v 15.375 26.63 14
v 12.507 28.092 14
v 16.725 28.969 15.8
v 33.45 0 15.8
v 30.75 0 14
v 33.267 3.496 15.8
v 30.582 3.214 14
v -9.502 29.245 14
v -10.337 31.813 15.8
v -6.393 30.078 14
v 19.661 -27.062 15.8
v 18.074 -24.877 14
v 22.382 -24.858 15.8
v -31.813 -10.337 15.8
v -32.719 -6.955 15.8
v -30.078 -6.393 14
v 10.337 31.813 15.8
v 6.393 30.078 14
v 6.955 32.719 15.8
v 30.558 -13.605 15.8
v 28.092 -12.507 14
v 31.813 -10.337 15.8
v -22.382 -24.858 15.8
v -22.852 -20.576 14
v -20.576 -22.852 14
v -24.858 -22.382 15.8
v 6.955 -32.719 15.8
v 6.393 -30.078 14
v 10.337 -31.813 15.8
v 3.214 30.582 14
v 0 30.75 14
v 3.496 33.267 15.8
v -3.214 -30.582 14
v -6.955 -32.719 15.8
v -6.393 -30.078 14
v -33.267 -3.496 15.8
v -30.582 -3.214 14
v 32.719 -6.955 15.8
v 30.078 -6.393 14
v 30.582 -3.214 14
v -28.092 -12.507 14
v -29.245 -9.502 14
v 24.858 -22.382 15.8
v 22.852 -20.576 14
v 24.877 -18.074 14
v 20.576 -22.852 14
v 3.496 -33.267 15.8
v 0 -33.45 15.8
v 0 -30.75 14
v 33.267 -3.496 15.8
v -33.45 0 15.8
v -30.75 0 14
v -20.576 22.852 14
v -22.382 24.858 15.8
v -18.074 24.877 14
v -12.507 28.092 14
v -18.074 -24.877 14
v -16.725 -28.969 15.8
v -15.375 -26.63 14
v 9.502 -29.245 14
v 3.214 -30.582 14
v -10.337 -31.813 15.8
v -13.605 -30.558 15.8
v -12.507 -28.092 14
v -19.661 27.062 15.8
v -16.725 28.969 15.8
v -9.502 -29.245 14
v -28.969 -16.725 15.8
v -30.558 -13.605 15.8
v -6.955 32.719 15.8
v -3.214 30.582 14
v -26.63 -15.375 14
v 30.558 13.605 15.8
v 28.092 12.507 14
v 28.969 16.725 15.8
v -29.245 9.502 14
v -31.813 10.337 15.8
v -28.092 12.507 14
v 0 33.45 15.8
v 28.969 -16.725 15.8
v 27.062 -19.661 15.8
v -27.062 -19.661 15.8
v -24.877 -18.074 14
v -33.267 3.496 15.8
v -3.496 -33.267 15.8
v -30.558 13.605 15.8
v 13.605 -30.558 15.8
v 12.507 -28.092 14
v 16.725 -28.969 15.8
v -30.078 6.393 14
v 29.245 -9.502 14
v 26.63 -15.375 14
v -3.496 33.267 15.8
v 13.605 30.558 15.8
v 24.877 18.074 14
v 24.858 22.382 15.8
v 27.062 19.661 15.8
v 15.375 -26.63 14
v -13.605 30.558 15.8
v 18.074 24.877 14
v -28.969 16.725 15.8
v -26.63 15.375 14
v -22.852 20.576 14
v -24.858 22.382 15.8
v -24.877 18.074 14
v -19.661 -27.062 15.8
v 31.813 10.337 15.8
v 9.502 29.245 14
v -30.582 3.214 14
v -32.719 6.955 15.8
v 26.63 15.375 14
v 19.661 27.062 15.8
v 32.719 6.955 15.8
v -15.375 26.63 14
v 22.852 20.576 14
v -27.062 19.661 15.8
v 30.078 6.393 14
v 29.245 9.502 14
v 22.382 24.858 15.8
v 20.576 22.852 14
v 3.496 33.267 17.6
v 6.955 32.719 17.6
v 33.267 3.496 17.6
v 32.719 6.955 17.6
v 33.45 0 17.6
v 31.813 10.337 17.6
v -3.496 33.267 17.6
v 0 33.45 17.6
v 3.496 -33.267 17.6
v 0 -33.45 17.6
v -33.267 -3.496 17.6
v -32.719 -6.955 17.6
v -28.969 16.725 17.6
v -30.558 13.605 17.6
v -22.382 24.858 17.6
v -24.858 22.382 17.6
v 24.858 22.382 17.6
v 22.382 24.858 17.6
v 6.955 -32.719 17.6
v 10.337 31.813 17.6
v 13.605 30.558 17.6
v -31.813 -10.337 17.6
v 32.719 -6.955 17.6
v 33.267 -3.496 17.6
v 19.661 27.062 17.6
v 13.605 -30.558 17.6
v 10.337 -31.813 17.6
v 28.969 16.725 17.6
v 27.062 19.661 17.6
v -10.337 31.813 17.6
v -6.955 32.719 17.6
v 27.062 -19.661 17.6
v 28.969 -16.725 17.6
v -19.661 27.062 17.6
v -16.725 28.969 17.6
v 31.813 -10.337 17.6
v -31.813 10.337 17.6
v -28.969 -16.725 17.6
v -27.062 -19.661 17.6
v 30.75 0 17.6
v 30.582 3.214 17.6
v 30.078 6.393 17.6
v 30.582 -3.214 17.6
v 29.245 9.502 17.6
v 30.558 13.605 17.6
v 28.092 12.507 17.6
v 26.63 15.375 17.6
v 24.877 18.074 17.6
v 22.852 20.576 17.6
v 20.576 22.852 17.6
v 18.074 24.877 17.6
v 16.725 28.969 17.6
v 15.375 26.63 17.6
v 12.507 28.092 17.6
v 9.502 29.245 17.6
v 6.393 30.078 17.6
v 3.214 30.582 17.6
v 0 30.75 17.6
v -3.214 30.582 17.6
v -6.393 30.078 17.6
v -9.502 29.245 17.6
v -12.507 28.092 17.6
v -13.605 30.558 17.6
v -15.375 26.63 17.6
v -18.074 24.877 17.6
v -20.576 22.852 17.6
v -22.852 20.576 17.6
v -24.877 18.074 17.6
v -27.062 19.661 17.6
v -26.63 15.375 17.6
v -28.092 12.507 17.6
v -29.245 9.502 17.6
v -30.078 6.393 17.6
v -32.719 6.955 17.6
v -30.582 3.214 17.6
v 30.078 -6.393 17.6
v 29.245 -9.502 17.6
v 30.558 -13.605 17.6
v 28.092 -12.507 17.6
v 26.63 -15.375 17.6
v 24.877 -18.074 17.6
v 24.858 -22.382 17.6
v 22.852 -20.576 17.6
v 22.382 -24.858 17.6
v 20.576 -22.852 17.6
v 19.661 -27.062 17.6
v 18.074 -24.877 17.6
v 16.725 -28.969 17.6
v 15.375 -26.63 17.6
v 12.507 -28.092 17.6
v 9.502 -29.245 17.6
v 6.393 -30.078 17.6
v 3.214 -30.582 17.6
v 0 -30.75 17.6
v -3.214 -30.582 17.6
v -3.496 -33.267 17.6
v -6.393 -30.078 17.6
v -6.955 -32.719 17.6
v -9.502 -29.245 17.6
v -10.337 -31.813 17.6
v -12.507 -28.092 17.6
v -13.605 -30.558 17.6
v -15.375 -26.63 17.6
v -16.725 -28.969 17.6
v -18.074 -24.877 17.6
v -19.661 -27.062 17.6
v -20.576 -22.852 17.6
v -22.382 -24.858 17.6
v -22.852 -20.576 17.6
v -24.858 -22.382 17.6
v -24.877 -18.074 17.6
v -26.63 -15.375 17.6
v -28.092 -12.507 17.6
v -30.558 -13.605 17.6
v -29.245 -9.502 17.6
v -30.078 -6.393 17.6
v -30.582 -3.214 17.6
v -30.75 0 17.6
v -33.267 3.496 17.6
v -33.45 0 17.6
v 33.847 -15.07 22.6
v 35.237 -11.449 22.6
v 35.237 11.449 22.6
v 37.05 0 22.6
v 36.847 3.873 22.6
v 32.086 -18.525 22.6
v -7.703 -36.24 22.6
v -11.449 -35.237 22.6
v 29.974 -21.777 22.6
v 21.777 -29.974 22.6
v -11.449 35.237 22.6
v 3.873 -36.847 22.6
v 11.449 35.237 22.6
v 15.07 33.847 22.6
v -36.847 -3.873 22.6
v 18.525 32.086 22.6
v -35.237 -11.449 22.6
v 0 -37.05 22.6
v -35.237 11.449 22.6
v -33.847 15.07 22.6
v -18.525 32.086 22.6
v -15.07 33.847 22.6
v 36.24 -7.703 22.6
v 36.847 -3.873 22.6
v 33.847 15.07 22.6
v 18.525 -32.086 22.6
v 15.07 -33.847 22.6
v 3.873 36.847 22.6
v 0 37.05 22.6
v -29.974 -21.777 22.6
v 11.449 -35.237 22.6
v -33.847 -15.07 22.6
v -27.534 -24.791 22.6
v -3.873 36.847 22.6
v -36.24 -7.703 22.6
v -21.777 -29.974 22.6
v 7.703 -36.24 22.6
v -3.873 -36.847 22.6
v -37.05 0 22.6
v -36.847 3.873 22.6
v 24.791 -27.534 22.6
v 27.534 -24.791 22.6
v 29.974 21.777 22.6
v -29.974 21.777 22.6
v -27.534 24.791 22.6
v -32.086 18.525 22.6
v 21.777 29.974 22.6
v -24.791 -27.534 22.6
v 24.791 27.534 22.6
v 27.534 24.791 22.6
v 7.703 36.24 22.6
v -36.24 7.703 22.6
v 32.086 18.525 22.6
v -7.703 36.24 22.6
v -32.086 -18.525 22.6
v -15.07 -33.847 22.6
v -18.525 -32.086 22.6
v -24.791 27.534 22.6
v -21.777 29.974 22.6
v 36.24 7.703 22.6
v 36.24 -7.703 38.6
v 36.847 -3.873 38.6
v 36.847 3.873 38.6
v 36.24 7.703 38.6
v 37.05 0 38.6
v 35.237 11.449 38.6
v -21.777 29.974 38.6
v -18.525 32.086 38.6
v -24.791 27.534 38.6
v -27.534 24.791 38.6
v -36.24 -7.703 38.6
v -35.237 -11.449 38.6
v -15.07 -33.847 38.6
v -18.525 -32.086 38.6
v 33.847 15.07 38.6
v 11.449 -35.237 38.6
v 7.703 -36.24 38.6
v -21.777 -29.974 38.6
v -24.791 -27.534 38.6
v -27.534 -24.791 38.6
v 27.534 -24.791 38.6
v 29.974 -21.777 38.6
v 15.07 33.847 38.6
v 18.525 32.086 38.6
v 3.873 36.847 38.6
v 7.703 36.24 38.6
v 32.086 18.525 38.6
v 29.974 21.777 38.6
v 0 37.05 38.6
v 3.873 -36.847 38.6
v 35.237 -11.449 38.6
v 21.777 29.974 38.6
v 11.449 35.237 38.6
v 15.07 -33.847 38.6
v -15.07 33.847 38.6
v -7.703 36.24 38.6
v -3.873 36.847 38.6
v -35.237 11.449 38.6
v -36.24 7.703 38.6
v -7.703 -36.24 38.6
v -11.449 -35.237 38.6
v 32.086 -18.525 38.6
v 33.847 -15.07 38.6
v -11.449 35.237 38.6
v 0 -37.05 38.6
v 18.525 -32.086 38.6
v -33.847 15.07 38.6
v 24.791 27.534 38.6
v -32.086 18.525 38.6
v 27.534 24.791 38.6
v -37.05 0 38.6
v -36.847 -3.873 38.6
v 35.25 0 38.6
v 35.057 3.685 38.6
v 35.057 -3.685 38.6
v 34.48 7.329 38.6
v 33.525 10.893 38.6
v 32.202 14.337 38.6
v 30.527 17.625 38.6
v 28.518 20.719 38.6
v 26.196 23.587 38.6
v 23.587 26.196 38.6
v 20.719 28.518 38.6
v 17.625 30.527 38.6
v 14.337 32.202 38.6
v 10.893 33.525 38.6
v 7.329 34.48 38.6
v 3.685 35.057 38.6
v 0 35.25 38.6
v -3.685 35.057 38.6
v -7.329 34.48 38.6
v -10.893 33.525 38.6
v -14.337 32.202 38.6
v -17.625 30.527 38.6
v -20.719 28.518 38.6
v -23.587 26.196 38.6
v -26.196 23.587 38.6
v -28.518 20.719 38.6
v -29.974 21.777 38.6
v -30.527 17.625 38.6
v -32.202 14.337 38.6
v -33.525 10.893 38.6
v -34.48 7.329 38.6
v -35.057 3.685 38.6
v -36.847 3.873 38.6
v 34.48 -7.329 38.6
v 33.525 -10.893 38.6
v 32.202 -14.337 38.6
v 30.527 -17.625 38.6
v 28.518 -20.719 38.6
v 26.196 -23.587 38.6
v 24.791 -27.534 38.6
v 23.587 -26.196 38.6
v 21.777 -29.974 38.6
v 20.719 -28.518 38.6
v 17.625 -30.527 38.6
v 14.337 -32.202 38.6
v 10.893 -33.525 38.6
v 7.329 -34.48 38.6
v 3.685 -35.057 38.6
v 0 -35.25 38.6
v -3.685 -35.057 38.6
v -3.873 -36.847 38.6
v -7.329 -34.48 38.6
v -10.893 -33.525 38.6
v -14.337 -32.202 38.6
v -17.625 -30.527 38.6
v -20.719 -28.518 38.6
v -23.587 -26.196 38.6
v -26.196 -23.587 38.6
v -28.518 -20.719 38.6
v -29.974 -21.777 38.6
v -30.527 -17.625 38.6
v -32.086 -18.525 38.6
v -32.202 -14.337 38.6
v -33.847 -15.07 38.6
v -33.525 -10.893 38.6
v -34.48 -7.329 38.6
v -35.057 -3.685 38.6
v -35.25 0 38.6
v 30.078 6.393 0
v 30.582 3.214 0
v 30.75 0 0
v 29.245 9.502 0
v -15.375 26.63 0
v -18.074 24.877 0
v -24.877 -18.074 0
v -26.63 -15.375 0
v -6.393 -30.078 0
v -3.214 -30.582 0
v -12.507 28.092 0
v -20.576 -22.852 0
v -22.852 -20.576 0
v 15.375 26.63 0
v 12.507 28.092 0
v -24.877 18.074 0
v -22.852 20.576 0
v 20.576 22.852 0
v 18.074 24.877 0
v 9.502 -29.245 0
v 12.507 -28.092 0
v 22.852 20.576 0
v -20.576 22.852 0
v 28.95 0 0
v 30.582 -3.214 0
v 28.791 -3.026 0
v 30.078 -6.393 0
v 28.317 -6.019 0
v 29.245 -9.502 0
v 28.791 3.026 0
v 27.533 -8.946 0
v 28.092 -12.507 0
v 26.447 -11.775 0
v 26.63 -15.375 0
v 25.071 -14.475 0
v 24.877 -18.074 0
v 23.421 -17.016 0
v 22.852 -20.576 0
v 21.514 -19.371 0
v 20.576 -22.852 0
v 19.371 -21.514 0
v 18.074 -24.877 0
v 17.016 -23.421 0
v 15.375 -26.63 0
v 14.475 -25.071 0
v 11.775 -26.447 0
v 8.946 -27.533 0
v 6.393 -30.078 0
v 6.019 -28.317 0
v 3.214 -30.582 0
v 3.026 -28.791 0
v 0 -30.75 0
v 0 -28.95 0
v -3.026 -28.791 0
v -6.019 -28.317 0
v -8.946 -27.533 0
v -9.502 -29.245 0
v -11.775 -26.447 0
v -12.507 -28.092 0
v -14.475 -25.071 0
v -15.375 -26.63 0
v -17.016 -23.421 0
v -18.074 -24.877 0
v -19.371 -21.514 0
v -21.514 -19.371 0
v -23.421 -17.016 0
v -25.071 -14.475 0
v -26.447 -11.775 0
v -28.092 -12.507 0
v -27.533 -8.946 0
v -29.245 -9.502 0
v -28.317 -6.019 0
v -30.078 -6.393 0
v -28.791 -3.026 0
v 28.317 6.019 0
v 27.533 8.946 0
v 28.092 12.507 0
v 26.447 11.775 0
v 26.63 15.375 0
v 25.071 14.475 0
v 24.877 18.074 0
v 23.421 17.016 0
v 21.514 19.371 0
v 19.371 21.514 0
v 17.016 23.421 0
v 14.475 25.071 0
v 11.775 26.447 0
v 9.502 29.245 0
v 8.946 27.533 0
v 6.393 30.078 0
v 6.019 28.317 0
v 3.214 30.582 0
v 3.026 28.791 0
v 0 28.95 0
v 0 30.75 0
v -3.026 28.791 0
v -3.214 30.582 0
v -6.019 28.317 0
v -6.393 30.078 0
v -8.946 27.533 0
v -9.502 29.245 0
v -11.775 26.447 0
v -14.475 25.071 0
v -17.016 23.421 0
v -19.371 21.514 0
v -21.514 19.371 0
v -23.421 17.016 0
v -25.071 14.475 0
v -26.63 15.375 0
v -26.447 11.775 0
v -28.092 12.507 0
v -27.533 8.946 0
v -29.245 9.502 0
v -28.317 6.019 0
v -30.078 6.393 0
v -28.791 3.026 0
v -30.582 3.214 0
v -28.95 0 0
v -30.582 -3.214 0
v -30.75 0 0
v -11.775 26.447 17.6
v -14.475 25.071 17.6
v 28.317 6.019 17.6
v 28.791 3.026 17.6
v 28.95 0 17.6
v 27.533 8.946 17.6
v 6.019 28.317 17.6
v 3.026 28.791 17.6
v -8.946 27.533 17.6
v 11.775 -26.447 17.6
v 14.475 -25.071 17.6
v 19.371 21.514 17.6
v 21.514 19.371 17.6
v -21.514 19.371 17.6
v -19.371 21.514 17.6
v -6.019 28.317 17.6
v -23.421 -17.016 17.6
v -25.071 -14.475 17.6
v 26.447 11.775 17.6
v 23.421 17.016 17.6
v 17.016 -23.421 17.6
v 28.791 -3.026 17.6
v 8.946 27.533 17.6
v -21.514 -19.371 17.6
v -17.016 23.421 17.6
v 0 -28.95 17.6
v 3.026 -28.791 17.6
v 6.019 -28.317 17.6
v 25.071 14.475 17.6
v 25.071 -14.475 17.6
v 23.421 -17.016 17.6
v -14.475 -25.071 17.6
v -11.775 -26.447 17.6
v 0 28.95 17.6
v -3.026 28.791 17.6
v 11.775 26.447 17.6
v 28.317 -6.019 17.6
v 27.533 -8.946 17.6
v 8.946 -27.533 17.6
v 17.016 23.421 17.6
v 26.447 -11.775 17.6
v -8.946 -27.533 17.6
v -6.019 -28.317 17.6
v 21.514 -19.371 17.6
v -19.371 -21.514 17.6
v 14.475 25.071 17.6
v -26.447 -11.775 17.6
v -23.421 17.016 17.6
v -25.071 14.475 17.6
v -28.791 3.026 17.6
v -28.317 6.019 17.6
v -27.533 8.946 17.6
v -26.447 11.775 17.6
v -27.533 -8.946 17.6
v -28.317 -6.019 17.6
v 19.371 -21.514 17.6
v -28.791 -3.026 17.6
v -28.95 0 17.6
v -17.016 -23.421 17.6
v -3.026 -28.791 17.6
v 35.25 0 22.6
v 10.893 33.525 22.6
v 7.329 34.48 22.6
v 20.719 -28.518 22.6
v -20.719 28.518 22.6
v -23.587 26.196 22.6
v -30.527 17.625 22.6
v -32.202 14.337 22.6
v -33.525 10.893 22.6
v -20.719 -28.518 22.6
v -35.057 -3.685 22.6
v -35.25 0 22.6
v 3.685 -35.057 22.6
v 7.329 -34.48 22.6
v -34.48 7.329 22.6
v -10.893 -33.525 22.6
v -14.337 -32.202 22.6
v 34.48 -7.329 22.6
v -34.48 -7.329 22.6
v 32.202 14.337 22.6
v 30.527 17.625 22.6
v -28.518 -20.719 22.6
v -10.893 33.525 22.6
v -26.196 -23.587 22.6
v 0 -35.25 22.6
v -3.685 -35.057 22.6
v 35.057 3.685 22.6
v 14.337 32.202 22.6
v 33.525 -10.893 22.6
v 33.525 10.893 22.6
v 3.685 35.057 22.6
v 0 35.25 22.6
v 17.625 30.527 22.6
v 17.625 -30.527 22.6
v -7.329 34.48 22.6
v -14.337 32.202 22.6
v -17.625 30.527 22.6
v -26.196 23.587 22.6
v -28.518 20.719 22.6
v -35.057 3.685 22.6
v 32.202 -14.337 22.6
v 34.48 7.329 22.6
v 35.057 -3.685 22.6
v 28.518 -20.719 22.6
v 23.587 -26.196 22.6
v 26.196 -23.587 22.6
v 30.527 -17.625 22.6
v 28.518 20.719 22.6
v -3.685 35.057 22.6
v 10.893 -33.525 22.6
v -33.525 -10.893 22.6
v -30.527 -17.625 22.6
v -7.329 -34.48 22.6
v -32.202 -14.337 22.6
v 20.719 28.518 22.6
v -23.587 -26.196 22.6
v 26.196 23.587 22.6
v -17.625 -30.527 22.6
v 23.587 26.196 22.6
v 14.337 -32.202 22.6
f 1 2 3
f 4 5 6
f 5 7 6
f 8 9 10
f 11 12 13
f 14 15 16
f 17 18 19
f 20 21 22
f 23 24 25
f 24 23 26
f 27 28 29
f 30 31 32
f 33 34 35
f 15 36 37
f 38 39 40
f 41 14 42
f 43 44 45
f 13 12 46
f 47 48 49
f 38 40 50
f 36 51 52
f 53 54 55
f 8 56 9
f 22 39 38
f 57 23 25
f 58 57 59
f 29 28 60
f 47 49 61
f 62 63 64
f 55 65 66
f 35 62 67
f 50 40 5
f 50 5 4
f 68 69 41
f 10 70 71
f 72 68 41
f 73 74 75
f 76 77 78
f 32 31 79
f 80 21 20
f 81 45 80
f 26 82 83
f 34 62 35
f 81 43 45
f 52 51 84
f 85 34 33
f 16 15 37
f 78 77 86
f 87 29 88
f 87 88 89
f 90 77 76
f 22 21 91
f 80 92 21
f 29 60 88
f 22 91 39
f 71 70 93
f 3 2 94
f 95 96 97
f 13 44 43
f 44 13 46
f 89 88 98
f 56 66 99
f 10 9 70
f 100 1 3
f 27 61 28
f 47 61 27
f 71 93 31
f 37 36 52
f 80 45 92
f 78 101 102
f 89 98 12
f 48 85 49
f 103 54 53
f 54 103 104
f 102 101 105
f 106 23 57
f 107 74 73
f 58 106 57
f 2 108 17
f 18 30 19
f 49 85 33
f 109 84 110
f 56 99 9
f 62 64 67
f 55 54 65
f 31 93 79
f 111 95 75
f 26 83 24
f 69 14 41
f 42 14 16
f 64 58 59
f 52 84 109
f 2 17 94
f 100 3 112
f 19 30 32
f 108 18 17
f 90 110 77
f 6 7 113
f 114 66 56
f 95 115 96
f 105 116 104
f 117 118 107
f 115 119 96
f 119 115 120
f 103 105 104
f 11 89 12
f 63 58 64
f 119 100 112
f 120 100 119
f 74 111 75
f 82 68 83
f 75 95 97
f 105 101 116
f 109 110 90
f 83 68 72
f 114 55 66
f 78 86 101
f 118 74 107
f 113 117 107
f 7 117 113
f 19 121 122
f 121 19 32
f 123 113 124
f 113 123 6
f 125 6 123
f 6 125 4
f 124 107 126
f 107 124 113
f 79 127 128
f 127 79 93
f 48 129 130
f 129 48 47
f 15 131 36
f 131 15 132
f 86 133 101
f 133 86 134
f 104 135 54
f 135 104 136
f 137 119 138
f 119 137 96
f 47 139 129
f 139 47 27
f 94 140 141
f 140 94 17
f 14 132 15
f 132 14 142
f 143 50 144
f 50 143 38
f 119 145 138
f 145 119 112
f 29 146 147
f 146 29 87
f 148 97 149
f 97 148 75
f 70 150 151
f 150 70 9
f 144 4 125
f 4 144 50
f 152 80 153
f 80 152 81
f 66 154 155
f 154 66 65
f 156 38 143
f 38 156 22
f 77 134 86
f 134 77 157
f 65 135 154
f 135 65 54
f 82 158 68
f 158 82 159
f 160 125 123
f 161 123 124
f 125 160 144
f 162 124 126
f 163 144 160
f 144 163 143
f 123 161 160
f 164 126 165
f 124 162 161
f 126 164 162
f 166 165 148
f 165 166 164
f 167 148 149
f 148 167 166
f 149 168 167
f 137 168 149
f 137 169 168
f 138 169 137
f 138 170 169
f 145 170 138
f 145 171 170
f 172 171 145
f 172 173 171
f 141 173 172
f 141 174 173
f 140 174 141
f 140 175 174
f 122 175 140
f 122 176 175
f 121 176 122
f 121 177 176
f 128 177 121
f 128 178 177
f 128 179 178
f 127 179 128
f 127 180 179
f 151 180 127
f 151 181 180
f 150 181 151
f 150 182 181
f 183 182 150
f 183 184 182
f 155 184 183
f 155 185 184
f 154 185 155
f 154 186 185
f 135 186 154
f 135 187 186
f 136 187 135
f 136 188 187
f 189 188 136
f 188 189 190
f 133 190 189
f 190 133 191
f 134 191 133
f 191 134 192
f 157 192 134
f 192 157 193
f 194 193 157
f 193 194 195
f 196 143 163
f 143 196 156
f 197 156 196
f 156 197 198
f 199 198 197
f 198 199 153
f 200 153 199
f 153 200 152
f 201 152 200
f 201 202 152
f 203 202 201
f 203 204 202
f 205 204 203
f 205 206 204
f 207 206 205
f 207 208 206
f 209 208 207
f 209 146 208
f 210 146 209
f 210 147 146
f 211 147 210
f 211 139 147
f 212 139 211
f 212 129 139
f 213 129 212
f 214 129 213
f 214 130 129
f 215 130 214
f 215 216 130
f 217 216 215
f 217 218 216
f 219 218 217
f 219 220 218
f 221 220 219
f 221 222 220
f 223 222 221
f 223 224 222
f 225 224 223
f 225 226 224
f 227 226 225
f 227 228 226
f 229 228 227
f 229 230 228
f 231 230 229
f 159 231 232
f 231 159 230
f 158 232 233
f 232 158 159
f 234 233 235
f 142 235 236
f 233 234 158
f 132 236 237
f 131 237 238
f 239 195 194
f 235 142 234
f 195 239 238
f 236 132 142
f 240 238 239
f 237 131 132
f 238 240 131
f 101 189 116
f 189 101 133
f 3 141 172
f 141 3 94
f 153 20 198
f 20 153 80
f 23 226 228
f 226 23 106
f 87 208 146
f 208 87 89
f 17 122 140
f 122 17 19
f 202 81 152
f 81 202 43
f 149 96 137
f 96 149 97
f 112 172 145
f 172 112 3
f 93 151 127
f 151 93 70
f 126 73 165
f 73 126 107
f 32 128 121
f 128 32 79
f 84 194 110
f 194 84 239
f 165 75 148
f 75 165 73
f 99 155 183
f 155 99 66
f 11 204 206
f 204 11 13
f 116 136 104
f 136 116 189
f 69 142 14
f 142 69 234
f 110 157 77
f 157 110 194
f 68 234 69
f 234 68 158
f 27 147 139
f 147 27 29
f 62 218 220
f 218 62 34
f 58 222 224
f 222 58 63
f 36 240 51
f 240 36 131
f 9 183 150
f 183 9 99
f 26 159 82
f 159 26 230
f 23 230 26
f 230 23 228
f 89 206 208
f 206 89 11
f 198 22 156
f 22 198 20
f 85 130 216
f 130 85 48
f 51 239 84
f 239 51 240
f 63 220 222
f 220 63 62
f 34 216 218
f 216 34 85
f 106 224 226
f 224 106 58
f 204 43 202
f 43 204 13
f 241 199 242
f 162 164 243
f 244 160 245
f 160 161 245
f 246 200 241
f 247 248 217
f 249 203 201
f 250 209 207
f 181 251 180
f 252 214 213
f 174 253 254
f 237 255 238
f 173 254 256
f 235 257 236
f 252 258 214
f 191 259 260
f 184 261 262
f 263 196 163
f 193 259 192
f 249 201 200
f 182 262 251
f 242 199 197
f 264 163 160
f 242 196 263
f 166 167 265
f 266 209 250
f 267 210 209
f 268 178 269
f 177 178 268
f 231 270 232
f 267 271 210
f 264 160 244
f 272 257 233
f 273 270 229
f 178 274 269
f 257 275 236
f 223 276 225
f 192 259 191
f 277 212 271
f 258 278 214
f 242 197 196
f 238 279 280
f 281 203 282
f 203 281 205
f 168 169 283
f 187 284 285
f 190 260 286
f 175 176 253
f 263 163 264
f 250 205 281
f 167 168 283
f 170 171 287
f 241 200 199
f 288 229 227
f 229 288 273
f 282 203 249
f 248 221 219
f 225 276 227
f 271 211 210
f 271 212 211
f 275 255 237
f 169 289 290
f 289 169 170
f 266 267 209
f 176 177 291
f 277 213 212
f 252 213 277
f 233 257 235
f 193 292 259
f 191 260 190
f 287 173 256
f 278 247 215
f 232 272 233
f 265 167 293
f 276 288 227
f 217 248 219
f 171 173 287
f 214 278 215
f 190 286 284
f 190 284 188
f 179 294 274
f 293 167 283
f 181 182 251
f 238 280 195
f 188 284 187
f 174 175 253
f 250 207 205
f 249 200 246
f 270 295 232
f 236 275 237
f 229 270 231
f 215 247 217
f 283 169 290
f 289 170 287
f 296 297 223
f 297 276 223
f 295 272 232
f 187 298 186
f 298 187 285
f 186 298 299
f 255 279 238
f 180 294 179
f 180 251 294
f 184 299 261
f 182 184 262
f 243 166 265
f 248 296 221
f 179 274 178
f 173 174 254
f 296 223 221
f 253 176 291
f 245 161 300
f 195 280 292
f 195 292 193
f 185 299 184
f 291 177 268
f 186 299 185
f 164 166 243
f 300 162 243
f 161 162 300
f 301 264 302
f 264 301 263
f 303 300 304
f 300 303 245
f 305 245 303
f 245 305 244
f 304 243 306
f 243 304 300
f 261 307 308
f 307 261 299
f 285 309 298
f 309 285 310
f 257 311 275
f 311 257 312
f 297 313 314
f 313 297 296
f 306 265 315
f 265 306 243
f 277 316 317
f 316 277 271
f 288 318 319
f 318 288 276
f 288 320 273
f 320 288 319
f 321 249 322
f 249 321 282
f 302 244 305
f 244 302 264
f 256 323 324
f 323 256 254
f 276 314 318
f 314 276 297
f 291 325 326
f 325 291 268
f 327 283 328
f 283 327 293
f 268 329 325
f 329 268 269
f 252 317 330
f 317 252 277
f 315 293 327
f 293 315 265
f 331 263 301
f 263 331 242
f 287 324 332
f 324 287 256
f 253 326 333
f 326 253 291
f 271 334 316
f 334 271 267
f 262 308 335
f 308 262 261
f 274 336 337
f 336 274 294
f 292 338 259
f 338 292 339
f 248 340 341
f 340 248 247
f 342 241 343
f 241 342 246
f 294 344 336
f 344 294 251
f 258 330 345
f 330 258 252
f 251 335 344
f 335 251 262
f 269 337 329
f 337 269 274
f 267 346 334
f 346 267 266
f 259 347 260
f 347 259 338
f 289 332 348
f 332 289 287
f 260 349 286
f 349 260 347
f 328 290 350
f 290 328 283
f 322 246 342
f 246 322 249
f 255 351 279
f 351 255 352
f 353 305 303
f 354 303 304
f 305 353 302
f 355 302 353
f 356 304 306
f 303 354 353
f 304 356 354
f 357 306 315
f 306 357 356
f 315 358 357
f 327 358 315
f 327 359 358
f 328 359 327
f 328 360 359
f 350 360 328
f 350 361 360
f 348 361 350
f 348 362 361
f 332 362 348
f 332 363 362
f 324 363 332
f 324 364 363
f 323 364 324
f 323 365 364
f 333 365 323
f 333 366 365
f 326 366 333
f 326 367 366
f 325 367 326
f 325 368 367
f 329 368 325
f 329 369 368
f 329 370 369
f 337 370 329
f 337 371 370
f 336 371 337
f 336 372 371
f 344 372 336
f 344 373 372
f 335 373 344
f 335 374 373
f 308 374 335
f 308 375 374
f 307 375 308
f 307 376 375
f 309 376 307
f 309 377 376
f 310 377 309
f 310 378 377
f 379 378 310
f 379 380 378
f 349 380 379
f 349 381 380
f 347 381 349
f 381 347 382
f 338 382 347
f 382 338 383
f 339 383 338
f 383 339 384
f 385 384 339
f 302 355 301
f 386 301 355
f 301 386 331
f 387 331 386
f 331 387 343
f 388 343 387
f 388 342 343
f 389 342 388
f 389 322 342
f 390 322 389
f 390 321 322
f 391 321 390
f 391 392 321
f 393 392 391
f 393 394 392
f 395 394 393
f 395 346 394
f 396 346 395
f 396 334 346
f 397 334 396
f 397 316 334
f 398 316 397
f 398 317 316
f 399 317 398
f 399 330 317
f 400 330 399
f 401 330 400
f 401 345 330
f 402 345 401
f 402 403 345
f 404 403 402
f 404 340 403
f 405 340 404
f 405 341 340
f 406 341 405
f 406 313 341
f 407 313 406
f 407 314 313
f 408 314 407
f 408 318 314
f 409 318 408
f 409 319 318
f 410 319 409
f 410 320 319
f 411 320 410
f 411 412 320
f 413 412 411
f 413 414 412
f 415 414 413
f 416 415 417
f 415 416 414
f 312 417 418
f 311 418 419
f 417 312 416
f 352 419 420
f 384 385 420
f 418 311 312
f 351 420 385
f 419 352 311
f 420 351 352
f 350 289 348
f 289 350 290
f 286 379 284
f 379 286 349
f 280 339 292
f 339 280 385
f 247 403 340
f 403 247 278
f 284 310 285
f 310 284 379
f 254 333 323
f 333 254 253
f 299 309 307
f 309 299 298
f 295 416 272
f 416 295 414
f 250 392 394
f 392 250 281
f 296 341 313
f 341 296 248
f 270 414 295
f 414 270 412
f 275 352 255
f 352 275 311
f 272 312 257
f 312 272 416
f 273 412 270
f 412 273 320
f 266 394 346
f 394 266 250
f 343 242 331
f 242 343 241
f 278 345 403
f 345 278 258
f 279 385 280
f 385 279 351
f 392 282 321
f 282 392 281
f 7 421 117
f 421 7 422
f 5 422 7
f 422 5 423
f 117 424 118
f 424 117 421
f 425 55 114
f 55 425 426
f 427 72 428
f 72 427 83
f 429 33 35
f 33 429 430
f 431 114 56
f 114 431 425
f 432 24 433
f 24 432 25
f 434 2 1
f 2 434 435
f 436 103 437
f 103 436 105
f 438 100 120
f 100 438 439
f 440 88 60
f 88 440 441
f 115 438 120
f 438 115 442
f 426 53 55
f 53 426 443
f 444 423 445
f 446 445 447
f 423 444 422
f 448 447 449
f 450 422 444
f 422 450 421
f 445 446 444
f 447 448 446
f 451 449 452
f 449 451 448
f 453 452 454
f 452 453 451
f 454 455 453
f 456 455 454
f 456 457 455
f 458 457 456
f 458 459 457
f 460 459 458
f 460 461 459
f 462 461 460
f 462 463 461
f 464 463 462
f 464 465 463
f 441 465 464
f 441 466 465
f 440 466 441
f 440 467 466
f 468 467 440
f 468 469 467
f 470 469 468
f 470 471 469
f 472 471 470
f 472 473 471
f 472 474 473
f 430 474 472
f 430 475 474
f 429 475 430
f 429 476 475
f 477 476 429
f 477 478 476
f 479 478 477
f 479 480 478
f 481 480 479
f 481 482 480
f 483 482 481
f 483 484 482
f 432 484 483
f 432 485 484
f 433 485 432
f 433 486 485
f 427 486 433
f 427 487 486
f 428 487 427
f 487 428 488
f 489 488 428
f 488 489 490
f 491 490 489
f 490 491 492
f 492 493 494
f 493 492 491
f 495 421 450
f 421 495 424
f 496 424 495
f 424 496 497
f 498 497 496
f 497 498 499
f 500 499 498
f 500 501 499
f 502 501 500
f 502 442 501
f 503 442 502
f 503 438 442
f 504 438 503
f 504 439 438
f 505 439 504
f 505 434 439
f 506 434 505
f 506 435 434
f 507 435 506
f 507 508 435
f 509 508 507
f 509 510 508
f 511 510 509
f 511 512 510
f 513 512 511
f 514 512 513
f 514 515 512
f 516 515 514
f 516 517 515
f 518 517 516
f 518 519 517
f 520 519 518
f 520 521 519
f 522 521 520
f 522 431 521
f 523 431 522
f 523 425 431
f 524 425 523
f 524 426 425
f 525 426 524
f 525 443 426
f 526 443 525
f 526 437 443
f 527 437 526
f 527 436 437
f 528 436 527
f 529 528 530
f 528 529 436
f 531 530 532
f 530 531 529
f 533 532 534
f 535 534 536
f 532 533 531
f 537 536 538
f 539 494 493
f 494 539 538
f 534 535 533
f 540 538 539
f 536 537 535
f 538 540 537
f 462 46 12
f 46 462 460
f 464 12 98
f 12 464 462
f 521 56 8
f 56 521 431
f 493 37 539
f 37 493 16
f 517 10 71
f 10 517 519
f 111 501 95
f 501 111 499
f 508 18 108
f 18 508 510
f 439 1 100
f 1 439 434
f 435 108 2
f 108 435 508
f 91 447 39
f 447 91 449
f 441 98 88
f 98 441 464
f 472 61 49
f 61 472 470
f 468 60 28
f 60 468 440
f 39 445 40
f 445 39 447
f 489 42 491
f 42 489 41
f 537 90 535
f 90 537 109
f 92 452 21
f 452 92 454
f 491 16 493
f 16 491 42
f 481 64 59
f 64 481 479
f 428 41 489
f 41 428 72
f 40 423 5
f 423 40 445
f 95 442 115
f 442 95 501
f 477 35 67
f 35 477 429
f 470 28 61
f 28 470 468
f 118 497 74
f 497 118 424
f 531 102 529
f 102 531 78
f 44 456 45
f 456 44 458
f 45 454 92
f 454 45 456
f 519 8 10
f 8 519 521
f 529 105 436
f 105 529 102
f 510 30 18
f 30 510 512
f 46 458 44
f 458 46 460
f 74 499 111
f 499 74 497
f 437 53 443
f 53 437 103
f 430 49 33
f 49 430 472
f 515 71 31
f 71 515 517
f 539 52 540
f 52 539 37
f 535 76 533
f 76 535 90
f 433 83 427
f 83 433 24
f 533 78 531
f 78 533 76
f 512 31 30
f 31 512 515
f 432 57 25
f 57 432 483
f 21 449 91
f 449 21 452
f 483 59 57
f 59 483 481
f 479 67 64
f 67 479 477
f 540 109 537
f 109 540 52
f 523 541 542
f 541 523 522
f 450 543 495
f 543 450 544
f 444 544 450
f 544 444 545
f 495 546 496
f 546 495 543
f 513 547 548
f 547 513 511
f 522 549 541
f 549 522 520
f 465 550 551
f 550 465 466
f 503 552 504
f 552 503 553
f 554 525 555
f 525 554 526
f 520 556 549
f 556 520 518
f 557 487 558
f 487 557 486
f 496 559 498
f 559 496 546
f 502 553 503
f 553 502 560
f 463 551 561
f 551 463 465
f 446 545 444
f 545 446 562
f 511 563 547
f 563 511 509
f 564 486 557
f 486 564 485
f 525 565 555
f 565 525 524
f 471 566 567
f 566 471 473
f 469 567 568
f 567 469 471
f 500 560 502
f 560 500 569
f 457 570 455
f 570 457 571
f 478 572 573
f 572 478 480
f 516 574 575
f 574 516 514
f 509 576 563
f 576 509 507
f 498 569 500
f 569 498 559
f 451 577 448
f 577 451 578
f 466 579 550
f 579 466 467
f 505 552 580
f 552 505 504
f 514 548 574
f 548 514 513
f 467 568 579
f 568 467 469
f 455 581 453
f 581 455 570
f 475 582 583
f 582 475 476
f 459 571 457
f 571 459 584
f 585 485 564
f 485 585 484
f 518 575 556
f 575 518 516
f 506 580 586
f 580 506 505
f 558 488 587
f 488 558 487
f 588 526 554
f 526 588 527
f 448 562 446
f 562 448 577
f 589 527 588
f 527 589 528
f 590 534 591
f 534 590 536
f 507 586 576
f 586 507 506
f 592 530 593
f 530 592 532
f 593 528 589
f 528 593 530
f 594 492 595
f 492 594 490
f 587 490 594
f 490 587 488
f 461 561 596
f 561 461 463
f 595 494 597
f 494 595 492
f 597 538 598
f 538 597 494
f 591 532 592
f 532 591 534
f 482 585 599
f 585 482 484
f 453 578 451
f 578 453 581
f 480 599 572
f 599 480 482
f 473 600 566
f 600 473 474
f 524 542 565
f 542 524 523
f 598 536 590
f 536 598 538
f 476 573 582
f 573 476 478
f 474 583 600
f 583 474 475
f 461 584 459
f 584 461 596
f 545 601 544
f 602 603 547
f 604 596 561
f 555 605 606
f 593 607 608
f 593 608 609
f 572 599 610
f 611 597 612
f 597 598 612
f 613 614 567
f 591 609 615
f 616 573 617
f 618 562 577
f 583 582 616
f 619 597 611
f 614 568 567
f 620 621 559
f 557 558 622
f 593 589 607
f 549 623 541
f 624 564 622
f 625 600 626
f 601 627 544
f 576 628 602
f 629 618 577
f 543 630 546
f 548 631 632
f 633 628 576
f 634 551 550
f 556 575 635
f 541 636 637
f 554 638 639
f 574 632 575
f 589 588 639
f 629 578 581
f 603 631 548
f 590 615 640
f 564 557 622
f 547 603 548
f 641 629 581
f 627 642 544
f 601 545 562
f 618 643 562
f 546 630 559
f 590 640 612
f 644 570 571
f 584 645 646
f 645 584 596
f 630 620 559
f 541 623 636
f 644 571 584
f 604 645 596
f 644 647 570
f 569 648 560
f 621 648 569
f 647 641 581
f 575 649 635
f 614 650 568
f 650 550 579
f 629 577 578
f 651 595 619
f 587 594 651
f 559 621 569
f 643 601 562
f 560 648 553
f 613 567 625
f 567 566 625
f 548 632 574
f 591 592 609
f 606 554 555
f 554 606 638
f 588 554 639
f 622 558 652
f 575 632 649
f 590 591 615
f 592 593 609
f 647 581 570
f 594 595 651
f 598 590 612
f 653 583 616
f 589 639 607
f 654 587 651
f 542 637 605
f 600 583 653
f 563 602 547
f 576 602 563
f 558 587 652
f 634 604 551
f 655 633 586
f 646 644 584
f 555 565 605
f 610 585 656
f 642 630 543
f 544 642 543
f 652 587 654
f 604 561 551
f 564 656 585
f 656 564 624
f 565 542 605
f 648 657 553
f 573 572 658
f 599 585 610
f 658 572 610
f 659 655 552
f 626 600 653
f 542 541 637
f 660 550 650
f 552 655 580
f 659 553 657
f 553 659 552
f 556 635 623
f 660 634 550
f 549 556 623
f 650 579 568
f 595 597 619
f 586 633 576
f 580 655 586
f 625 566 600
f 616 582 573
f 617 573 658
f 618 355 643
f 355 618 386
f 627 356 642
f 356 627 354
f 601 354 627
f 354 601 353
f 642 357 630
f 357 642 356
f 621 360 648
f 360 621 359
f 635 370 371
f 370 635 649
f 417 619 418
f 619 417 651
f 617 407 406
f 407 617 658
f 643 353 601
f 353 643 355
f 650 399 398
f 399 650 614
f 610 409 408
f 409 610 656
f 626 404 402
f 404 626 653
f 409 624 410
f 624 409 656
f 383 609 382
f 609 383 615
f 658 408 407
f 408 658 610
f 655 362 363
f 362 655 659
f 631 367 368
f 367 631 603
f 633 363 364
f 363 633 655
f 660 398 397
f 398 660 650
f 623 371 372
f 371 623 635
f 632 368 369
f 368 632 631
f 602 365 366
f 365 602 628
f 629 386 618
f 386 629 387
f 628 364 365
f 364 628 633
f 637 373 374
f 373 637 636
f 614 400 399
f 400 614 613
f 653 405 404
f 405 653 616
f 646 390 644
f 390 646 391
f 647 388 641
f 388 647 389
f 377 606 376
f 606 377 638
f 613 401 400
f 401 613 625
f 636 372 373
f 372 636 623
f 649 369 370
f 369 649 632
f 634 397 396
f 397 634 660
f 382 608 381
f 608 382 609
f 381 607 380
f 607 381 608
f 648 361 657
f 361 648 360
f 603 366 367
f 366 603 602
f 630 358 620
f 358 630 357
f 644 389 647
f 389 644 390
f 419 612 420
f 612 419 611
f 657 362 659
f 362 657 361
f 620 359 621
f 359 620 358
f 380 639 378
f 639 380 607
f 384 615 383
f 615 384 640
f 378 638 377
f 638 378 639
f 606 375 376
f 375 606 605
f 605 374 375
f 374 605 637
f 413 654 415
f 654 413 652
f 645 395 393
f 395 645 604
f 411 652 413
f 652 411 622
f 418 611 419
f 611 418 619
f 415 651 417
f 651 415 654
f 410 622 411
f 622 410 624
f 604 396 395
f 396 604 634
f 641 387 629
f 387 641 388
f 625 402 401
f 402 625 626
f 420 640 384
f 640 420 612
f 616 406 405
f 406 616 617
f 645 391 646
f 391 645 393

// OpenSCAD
/*
VAC HOSE ADAPTER, but can use for other stuff too...

Example default values configured are for specific Vac Hose
used with my LowRider 3.  See...
  https://www.printables.com/model/550066-lowrider-3-vac-hose-adapter-25-and-parametric-scad

RELATED WORK:
- Originally based on FollyMaker's Thingiverse script.  
  Discovered thanks to Philippe on V1E forum post.
  - https://www.thingiverse.com/thing:1246651
  - https://forum.v1e.com/t/vacuum-hose-size/35926/3?u=aaronse

  
         1         2         3         4         5         6
123456789012345678901234567890123456789012345678901234567890
*/

/* [Parameters] */

// Is Adapter's lower end, is the measurement for outside 
// or inside diameter?
lowerEndMeasured = "outside"; //[outside, inside]

// Diameter of Lower End? (mm)
lowerEndDiameter = 61.5;

// Length of Lower End? (mm)
lowerEndLength = 14;

// For the Upper end, is the measurement the adapter's outside 
// or inside diameter?
upperEndMeasured = "inside"; //[outside, inside]

// Diameter of Upper End? (mm)
upperEndDiameter = 70.5;

// Length of Upper End? (mm)
upperEndLength = 16;

// Length of Taper Section? (mm)
taperLength = 5;

// Create an Inside Stop at the lower end of Upperer end of 
// this adapter? (To keep the connected fitting from being
// sucked in.)
insideStop = "no"; //[no,yes]

// What is the thickness of the adapter's walls?
wallThickness = 1.8;

// Flag indicating whether to cutout notch from top
hasCutout = "no";

// Cutout dimensions
cutOutHeight = 12;
cutOutWidth = 25;

// [yes,no] Flag indicating whether to generate flange
hasFlange = "yes";

$fn = 60 * 1;

WT = wallThickness;
LL = lowerEndLength;
SL = upperEndLength;
TL = taperLength;

LD = lowerEndMeasured == "inside" 
  ? lowerEndDiameter + 2 * WT 
  : lowerEndDiameter;
  
SD = upperEndMeasured == "inside" 
  ? upperEndDiameter + 2 * WT 
  : upperEndDiameter;
  
LID = lowerEndMeasured == "inside" ? LD : LD - 2 * WT;
SID = upperEndMeasured == "inside" ? SD : SD - 2 * WT;
LID = LD - 2 * WT;
SID = SD - 2 * WT;
DR = LD + 3 * WT;

top = (hasFlange == "yes") ? SL + LL + TL + 2 * WT : SL + LL + TL;

module transCylinder(D1, D2, H, Z)
{
  translate([ 0, 0, Z ])
  {
    cylinder(d1 = D1, d2 = D2, h = H, center = false);
  }
}

difference()
{
  union()
  {
    transCylinder(LD, LD, LL, 0); // Lower

    if (hasFlange == "yes")
    {
      // Lower to Flange
      transCylinder(LD, DR, WT, LL);               
      
      // Flange
      transCylinder(DR, DR, WT, LL + WT);          
      
      // Flange to Upper
      transCylinder(LD, SD, TL, LL + 2 * WT);      
      
      // Upper
      transCylinder(SD, SD, SL, LL + TL + 2 * WT); 
    }
    else
    {
      // Transition
      transCylinder(LD, SD, TL, LL);      
        
      // Upper
      transCylinder(SD, SD, SL, LL + TL); 
    }
  }
  
  union()
  {
    // Lower
    transCylinder(LID, LID, LL + 1, 0); 
    if (hasFlange == "yes")
    {
      // Lower to Flange
      transCylinder(LID, LID, WT, LL);
      
      // Flange
      transCylinder(LID, LID, WT, LL + WT);
      
      // Flange to Upper
      transCylinder(LID, SID, TL, LL + 2 * WT); 
    }
    else
    {
      // Lower-to-Upper
      transCylinder(LID, SID, TL, LL);      
      
      // Upper
      transCylinder(SID, SID, SL, LL + TL); 
    }

    if (hasCutout == "yes")
    {
      translate(
        [ SD / 2 - (SD / 2),
        -(cutOutWidth / 2),
        top - cutOutHeight ])
      {
        cube(
          [ SD / 2, cutOutWidth, cutOutHeight ],
          center = false);
      }
    }

    if (insideStop == "yes")
    {
      transCylinder(
        SID,
        SID - (2 * WT),
        WT, 
        LL + TL + 2 * WT);
      
      transCylinder(
        SID,
        SID,
        SL,
        LL + TL + 3 * WT);
    }
    else
    {
      transCylinder(
        SID,
        SID,
        SL,
        LL + TL + 2 * WT);
    }
  }
}
